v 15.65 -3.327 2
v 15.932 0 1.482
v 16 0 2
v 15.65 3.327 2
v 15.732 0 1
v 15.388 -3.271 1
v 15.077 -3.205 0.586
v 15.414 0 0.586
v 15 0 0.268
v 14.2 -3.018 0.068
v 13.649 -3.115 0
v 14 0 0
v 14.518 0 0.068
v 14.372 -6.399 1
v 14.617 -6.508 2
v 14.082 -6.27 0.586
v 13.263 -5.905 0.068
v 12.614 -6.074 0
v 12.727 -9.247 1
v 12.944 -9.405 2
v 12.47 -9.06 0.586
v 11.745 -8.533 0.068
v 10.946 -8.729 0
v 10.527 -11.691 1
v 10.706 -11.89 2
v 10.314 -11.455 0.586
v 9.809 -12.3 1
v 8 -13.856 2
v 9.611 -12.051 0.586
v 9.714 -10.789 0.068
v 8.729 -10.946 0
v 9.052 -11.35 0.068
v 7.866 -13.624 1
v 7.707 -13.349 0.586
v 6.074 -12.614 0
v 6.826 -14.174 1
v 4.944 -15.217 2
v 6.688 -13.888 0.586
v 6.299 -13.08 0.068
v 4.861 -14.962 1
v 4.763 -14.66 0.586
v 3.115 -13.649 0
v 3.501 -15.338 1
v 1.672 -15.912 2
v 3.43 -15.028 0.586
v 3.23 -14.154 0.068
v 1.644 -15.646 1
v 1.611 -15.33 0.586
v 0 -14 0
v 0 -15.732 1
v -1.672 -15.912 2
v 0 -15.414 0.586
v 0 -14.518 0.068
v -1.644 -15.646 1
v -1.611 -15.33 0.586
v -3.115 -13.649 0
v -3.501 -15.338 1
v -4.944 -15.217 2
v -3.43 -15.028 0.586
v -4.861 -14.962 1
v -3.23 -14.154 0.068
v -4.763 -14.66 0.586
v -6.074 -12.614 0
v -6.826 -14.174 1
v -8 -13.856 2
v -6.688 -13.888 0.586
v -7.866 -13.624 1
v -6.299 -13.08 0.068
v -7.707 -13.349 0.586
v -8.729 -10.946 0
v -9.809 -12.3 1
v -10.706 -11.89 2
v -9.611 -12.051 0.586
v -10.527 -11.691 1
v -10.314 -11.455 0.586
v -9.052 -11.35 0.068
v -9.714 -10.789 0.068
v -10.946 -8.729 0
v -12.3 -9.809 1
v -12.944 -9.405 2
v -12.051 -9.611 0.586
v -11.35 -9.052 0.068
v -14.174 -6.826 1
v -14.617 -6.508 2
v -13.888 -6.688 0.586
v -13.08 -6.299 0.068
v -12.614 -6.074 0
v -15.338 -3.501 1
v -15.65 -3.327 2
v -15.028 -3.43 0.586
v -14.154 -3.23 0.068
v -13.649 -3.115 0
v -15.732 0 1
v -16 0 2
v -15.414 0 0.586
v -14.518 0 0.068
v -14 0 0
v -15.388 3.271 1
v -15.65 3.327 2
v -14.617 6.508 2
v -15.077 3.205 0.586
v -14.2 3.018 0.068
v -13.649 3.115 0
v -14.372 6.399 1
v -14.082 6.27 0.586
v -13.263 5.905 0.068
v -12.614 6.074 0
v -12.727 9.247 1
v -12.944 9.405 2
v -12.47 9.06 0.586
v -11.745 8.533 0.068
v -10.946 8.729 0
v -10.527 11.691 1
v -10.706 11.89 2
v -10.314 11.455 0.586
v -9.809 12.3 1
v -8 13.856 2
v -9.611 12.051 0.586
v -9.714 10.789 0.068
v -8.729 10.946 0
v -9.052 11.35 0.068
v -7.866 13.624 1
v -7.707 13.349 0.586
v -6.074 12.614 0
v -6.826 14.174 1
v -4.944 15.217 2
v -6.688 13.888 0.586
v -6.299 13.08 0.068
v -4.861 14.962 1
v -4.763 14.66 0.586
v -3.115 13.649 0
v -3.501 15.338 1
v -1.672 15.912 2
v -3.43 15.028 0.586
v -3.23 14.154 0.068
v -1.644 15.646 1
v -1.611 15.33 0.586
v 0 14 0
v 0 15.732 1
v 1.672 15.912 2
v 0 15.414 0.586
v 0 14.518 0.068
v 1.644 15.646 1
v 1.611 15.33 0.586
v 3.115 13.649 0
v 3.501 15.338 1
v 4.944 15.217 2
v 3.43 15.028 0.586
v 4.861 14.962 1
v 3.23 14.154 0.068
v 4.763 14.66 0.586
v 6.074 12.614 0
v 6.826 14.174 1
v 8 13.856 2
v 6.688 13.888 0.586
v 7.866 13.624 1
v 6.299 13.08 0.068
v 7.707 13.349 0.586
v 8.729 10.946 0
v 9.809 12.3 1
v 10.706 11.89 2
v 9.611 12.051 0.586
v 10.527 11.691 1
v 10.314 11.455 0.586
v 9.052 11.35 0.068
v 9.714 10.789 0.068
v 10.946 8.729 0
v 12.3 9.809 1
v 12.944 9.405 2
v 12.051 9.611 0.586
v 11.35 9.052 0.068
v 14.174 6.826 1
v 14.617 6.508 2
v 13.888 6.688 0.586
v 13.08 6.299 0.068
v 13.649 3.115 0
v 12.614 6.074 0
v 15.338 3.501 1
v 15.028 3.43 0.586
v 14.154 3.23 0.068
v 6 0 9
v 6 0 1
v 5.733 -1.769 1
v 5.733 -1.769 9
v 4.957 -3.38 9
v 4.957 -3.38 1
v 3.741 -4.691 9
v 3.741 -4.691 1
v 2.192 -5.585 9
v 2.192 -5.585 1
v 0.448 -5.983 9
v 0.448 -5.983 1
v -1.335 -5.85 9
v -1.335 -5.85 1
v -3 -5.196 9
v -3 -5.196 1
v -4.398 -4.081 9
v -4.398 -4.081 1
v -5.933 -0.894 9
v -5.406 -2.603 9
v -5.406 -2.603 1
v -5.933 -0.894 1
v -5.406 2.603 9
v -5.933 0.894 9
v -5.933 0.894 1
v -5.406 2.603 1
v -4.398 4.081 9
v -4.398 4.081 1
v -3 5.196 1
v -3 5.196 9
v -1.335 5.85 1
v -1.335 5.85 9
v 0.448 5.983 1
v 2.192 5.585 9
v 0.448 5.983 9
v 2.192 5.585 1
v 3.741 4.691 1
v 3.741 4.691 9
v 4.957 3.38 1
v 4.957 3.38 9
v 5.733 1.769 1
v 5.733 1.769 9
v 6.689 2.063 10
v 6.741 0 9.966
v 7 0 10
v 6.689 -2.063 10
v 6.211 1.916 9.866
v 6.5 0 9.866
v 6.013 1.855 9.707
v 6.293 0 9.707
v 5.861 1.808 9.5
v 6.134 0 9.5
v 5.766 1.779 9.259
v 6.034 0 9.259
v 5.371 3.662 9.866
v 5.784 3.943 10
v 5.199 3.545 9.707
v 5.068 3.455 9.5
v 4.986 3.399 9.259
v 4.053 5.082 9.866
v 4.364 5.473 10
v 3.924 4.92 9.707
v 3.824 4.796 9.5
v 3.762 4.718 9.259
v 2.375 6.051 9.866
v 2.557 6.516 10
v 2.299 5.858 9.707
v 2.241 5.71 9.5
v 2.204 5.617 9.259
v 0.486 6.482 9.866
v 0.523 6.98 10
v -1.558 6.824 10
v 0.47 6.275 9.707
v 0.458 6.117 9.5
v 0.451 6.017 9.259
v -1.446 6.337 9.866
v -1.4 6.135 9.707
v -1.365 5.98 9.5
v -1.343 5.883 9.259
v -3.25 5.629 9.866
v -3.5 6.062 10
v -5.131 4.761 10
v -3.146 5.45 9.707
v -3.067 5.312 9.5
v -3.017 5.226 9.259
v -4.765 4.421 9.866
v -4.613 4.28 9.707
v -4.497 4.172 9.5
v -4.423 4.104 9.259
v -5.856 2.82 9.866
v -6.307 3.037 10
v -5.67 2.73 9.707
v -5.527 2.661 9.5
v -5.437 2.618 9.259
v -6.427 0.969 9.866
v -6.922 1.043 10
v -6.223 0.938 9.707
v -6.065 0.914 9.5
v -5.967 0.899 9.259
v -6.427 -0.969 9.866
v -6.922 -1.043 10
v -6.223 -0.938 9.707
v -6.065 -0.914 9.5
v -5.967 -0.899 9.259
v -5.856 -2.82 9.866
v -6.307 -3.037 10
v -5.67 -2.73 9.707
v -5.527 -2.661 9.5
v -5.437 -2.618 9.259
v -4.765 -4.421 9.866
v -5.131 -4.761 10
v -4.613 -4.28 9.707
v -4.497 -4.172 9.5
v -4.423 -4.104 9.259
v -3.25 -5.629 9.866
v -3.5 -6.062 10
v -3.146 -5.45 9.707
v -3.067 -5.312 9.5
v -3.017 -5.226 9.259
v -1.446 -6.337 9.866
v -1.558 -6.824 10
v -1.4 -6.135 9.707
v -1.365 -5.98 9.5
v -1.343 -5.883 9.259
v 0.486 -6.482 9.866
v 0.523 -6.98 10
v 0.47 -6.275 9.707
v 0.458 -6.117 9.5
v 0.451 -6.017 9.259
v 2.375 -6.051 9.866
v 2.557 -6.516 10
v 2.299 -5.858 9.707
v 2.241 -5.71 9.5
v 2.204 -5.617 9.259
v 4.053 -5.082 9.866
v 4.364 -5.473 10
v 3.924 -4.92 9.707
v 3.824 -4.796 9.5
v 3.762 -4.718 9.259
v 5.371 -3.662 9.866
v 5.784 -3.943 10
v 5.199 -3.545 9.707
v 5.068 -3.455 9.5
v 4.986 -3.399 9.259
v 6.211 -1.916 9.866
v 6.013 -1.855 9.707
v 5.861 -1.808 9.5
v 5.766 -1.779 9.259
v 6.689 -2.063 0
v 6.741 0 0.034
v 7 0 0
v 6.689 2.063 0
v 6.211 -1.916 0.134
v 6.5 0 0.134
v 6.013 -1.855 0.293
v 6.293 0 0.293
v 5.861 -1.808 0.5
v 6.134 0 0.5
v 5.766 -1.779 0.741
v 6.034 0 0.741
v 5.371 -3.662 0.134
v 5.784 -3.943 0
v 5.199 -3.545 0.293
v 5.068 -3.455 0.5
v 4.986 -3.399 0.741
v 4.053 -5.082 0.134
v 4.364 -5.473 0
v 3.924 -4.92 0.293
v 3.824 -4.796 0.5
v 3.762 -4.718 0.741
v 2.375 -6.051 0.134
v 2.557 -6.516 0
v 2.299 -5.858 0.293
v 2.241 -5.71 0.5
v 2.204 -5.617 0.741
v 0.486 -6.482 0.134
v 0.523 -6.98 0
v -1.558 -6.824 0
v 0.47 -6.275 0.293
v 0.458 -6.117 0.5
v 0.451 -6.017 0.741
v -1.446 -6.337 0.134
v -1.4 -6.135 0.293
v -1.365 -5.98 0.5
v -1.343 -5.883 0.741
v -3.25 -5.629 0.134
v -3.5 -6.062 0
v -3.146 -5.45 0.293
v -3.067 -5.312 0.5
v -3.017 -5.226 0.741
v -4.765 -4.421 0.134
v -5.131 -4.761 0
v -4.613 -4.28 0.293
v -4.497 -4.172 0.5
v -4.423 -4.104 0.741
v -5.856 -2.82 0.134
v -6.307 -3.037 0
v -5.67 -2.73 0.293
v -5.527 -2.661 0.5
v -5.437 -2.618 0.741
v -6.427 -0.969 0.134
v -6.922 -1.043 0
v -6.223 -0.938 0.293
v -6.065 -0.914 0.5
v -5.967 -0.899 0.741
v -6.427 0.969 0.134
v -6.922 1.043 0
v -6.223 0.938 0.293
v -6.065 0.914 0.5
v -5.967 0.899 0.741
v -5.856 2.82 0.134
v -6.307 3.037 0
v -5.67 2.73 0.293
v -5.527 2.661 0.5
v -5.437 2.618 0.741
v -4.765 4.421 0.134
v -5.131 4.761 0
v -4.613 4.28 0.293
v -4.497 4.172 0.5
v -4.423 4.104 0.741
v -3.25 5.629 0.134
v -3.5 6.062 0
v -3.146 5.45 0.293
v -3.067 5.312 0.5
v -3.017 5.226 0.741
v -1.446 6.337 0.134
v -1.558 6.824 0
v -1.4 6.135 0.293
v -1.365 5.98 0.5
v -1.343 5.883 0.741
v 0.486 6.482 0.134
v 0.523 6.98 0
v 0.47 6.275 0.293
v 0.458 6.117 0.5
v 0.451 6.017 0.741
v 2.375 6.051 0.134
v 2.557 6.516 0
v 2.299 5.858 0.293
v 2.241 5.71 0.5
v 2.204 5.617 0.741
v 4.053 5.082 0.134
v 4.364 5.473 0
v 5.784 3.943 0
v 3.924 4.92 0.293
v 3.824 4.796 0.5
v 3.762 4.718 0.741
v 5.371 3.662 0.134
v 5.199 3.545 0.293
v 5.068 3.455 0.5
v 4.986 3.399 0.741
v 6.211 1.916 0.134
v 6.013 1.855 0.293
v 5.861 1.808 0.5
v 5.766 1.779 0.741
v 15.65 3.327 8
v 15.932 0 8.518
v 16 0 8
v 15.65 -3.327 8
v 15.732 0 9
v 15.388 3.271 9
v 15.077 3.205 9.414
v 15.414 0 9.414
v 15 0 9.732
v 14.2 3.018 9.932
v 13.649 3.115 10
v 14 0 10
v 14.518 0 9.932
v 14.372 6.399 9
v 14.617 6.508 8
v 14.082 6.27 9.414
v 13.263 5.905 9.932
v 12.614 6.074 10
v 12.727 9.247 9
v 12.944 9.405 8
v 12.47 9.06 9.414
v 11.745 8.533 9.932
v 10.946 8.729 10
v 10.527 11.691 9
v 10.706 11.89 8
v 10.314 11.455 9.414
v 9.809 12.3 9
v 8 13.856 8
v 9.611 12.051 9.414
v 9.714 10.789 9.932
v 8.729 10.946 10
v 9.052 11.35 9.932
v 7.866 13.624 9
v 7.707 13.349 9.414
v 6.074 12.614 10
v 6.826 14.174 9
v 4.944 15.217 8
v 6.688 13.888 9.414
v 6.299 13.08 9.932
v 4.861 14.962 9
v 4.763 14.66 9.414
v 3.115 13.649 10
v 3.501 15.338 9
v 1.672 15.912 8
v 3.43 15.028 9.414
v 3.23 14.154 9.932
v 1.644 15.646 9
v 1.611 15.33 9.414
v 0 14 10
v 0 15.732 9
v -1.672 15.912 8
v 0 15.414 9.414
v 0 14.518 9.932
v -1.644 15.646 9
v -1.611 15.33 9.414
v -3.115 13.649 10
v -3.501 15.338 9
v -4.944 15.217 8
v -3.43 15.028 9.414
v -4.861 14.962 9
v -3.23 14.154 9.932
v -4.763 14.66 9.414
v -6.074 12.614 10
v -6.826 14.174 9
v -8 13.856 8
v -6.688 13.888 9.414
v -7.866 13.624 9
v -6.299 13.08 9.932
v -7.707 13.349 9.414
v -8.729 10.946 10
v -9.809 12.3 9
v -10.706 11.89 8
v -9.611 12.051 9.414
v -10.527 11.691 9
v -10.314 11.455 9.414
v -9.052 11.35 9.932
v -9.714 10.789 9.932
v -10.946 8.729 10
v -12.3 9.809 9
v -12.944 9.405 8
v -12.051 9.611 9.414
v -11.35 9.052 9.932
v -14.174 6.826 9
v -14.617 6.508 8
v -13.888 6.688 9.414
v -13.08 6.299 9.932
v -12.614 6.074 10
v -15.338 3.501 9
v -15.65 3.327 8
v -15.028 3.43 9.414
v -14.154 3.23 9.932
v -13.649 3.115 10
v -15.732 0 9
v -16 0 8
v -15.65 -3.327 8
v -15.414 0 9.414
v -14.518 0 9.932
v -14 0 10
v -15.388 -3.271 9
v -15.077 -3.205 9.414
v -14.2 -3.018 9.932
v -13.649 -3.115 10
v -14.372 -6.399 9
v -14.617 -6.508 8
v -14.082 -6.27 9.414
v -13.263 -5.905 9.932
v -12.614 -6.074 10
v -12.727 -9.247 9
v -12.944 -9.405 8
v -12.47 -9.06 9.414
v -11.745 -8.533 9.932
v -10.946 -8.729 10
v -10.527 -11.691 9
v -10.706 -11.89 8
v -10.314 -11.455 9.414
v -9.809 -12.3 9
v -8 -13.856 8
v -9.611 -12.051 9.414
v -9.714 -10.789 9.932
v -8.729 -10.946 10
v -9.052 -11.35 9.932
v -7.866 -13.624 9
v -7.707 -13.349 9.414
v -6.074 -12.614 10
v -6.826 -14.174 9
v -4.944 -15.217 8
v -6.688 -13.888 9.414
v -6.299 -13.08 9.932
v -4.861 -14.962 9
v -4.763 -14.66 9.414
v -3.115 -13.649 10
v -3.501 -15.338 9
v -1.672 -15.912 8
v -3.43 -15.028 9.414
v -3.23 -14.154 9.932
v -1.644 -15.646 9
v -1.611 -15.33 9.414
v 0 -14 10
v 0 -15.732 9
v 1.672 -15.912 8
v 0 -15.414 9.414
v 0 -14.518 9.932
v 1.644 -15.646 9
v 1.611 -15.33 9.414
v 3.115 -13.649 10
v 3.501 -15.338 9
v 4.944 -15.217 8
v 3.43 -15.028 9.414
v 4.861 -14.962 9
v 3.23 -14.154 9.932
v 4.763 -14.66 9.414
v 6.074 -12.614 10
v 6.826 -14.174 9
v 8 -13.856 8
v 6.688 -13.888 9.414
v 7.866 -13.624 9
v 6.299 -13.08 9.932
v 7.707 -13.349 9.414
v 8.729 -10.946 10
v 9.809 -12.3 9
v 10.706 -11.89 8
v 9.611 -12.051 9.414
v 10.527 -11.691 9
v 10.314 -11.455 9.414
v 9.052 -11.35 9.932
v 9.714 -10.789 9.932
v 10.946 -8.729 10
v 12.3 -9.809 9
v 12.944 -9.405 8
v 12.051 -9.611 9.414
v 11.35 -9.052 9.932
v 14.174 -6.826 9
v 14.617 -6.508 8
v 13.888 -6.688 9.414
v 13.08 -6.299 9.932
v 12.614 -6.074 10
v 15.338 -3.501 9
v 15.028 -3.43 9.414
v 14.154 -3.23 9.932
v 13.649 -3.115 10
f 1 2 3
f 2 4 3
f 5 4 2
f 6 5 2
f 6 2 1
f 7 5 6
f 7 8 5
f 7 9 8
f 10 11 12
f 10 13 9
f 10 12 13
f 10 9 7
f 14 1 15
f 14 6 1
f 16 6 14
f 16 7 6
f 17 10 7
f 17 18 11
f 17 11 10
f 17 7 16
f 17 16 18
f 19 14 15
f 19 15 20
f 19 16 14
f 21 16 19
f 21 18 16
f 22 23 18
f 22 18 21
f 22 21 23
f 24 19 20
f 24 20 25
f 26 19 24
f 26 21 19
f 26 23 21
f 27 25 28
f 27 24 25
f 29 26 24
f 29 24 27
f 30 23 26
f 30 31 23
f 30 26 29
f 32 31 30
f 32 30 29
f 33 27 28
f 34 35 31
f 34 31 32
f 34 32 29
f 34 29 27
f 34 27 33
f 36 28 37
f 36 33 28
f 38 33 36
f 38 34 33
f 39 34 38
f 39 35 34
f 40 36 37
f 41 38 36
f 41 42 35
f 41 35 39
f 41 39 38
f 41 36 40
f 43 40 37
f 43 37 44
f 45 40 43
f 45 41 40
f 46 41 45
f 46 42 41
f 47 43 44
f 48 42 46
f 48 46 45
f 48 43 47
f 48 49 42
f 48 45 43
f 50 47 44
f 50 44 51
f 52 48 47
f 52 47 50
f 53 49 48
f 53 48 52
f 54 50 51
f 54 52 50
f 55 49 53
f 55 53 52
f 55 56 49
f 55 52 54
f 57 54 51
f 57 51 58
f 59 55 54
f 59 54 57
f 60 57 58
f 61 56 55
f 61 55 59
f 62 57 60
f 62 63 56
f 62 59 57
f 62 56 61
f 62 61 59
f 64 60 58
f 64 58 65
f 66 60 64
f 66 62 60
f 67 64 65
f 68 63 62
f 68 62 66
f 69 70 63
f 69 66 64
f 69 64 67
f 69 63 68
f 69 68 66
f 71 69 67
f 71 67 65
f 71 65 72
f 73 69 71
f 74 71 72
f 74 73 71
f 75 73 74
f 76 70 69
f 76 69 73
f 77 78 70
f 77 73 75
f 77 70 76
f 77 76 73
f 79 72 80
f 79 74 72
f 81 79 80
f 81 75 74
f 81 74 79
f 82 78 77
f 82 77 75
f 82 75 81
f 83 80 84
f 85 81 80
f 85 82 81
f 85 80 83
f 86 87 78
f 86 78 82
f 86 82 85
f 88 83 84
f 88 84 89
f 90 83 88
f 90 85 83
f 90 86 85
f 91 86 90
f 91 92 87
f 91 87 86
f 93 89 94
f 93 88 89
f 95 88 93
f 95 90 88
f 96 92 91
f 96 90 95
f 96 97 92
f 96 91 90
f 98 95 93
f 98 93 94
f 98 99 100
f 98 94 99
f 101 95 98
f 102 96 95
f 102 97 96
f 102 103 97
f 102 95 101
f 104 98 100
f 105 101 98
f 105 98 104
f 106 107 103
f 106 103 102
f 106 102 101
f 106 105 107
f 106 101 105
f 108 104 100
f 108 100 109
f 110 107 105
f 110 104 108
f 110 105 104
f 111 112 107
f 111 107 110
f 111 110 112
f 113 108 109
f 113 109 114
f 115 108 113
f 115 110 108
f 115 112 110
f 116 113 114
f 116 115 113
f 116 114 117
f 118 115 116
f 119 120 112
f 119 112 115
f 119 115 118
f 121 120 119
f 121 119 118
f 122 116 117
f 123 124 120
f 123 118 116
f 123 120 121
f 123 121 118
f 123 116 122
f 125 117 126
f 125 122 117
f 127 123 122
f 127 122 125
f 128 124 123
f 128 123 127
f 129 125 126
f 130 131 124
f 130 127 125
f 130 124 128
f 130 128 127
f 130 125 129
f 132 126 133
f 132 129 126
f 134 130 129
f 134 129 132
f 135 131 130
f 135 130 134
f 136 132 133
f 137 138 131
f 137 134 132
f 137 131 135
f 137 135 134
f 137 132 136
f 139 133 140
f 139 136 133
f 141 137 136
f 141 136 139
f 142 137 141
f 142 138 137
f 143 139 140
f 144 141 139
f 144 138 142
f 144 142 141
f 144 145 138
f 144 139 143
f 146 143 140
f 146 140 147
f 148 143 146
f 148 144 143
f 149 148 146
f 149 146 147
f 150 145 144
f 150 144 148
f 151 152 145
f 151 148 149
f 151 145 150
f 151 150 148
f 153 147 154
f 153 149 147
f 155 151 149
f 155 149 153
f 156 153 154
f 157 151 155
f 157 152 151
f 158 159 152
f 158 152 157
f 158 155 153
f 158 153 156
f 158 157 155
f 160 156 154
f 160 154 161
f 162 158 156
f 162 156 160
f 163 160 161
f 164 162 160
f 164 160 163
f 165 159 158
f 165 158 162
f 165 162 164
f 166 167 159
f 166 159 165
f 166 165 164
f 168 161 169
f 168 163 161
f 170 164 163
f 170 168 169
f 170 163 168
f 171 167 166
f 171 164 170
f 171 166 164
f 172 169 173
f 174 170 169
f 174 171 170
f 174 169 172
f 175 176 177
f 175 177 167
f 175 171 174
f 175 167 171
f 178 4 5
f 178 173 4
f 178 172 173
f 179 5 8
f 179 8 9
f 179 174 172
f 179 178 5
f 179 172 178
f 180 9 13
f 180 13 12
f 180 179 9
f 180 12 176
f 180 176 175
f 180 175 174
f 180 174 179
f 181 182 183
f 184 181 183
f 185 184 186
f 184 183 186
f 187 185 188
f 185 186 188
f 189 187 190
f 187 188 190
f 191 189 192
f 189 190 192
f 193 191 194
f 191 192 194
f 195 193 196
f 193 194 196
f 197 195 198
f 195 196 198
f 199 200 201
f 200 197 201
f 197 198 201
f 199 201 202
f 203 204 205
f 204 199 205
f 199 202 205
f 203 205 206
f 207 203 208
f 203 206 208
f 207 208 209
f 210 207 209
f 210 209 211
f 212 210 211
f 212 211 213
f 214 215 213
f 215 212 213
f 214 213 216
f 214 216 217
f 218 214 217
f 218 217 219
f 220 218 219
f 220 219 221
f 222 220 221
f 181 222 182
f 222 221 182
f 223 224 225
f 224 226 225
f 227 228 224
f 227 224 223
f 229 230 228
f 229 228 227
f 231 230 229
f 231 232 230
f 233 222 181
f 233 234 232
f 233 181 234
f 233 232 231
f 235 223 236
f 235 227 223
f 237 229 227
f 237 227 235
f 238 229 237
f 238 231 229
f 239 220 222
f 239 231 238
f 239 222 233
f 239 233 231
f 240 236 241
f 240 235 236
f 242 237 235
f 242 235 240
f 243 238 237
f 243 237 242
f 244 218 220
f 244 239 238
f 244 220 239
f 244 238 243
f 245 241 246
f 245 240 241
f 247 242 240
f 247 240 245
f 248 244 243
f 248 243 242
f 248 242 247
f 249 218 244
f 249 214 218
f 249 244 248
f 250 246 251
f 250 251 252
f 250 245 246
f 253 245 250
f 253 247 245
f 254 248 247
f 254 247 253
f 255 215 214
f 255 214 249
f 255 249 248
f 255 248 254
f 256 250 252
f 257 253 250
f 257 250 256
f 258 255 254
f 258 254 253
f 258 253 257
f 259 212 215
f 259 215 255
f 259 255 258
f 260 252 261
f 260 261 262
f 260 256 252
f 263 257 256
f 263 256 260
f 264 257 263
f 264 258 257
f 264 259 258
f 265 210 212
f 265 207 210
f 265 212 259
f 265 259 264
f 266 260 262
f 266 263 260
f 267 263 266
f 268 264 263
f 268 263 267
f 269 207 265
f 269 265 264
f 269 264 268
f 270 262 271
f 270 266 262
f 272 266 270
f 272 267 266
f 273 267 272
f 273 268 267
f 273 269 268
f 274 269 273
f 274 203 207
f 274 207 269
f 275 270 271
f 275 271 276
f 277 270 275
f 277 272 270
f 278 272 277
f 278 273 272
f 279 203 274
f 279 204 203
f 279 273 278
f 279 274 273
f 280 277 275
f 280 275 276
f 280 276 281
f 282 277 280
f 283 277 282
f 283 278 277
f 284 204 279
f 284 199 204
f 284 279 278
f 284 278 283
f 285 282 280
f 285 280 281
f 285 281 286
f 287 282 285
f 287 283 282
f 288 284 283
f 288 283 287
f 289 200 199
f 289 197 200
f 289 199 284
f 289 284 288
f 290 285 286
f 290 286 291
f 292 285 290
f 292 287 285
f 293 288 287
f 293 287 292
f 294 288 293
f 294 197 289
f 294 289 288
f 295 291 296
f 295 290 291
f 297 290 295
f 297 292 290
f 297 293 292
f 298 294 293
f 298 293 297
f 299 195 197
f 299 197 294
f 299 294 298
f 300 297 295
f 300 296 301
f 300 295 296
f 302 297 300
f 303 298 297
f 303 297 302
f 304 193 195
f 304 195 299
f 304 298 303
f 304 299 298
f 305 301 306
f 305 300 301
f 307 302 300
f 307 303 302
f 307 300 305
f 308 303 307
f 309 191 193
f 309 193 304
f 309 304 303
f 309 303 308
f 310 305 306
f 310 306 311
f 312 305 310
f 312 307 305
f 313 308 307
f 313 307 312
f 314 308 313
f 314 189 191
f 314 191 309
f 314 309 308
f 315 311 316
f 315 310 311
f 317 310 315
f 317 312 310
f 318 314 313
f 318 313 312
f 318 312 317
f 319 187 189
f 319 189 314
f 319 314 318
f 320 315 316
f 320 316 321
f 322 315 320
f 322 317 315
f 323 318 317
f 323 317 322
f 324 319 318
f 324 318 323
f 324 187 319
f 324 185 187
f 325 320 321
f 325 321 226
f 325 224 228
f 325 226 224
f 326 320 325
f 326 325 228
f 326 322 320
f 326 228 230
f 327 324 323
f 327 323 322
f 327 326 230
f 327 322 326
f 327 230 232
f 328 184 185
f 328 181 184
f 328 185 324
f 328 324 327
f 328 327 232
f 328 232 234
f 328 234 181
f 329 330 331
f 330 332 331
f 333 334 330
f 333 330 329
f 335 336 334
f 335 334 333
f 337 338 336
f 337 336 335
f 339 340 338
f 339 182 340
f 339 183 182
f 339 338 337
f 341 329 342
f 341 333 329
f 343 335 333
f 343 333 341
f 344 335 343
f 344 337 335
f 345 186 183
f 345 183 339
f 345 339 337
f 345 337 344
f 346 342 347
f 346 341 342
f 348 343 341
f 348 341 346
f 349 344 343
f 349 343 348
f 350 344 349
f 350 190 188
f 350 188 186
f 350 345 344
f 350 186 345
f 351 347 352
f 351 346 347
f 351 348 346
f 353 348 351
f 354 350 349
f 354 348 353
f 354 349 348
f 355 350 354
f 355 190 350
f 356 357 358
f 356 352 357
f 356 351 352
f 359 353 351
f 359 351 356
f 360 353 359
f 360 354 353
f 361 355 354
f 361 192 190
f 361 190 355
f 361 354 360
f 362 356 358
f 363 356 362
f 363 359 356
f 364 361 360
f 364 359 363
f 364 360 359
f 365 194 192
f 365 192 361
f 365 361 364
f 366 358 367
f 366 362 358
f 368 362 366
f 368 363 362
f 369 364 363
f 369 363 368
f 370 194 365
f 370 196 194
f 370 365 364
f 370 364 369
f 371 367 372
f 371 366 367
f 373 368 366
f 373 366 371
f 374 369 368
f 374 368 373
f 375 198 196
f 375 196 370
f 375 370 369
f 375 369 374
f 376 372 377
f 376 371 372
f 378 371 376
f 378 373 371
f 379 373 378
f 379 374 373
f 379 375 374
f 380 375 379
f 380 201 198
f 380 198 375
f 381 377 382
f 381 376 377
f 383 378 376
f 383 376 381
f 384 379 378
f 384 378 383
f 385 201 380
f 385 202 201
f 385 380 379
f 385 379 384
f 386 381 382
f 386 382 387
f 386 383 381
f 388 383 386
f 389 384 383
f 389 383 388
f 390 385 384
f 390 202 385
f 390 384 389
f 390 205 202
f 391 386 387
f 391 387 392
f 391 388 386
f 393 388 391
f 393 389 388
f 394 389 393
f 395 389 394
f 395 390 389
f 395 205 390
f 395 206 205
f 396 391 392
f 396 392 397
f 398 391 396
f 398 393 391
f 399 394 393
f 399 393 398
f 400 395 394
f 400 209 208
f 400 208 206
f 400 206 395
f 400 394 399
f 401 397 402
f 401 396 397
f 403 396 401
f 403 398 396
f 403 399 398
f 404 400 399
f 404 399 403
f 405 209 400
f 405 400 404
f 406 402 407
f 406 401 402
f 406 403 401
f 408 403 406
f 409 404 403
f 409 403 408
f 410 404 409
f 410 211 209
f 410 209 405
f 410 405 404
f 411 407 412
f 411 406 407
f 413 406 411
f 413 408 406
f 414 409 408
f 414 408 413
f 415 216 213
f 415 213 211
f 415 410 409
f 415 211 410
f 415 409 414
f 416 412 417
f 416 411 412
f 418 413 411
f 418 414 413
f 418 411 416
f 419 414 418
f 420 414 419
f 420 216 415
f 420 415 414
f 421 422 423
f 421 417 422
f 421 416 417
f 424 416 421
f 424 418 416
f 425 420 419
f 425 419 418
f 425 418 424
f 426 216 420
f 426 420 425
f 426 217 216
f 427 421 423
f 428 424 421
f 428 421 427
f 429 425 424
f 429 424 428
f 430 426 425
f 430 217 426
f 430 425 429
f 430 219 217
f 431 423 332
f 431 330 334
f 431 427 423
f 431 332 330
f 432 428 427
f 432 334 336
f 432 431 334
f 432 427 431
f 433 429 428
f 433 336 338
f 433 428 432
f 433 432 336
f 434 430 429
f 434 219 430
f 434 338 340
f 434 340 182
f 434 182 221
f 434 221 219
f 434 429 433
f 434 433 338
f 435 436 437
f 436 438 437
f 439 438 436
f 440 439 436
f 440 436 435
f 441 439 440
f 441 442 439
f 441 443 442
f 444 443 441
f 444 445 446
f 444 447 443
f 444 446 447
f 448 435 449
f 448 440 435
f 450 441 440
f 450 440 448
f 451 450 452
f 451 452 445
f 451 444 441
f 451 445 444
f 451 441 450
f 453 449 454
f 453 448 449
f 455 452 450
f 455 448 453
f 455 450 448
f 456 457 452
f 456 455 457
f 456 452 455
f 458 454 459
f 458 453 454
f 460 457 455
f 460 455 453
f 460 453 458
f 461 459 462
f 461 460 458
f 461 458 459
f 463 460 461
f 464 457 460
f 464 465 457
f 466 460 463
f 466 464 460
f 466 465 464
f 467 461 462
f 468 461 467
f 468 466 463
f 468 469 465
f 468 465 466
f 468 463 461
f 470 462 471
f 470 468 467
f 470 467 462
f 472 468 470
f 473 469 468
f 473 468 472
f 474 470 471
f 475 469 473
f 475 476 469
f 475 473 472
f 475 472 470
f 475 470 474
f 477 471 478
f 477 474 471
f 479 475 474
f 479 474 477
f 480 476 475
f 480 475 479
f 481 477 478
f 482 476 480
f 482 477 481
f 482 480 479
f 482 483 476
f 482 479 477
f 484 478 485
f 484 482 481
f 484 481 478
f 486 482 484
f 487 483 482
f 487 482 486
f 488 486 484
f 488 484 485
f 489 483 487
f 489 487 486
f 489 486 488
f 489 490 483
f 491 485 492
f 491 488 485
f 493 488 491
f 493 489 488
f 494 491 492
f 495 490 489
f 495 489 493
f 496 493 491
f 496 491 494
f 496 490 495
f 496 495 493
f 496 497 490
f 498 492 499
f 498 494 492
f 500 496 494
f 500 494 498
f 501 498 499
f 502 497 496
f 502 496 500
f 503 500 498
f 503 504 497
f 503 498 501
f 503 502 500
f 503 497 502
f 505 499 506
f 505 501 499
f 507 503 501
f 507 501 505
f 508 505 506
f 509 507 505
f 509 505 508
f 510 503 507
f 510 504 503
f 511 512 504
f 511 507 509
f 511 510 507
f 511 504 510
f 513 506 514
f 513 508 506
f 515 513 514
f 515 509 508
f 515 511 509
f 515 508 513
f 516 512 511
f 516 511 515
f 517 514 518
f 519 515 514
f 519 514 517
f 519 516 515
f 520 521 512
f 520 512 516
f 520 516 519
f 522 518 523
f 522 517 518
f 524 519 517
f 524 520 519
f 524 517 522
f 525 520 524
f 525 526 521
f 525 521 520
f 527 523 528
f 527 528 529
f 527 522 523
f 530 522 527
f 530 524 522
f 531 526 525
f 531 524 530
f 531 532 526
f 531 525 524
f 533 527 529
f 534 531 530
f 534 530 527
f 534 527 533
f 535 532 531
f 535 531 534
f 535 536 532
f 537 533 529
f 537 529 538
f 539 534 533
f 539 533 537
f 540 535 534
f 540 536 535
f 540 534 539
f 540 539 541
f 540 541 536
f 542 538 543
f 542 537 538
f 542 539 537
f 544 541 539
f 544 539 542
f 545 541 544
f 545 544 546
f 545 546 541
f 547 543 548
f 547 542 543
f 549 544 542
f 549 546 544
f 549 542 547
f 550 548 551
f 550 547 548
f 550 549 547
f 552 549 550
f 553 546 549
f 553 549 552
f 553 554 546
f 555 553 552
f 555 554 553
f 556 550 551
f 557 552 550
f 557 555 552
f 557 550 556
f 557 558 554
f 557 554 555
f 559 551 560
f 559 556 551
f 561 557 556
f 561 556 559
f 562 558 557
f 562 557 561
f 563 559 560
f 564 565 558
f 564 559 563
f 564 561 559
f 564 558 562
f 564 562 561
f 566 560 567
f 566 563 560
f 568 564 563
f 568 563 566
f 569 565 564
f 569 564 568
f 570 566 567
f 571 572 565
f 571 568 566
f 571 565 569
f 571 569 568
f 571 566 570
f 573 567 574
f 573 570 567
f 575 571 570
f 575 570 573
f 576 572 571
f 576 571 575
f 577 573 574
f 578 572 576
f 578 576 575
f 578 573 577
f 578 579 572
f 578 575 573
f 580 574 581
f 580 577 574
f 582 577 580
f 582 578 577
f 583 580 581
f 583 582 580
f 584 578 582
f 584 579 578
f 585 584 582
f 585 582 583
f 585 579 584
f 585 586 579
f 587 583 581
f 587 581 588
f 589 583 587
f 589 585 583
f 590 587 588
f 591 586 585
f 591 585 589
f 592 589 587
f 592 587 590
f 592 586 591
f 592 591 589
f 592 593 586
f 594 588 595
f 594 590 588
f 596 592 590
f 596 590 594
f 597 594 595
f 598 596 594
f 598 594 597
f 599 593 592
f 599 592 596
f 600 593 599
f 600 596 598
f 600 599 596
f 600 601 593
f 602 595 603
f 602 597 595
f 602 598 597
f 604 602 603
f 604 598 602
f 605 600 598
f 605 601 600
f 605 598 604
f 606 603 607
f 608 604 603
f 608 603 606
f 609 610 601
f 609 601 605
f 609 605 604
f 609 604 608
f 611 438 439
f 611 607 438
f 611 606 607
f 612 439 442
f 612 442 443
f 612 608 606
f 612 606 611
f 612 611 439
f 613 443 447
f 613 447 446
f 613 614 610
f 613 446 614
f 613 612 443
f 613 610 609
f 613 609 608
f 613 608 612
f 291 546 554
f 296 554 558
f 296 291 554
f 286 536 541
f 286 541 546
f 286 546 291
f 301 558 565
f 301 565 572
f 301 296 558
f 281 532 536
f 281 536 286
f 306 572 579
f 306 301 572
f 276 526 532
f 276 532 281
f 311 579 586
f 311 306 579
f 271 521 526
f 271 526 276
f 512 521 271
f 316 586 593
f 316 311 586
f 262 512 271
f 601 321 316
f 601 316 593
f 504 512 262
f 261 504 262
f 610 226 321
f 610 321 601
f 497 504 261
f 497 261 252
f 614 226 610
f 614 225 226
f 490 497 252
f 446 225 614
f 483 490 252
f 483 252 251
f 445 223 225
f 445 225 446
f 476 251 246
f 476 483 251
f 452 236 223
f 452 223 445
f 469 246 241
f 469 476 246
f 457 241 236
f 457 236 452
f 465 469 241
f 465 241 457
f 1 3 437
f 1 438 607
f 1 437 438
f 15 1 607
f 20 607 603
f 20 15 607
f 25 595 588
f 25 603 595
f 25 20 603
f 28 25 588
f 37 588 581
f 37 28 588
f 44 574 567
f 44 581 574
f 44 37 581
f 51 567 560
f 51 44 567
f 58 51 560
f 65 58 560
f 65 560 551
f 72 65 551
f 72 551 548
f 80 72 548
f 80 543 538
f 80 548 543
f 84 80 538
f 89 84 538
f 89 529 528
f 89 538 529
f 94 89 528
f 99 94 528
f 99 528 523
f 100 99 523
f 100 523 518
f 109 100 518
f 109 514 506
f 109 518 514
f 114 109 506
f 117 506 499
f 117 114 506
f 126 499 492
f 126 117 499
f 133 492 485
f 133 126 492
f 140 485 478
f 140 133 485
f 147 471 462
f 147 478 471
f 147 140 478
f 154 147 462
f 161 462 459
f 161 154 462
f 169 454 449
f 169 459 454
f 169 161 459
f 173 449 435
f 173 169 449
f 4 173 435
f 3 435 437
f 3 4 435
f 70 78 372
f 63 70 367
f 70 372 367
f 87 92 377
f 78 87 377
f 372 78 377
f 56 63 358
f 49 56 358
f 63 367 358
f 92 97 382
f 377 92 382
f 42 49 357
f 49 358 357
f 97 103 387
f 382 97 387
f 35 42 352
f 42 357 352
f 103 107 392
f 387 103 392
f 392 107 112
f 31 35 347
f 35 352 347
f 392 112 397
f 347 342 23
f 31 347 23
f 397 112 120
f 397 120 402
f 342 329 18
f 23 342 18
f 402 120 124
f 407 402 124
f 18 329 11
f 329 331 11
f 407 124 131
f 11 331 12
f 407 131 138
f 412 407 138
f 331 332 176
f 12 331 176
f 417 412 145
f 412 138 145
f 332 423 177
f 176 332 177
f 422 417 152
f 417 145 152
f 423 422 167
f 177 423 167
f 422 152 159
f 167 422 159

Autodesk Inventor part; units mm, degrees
ref_plane "YZ Plane" through (0, 0, 0) normal (1, 0, 0) x (0, 1, 0)
ref_plane "XZ Plane" through (0, 0, 0) normal (0, 1, 0) x (-1, 0, 0)
ref_plane "XY Plane" through (0, 0, 0) normal (0, 0, 1) x (1, 0, 0)
sketch "Sketch1" plane through (0, 0, 0) normal (0, 0, 1) x (1, 0, 0)
  circle A0 centre (0, 0) radius 16
  circle A1 centre (0, 0) radius 6
  dimension "d0" = 32
  dimension "d1" = 12
extrude "Extrusion1" add sketch "Sketch1" along normal blind 10
fillet "Fillet1" radius 2 2 edges at (-16, 0, 10) (-16, 0, 0)
fillet "Fillet2" radius 1 2 edges at (-6, 0, 10) (-6, 0, 0)
properties part number "6201RS" material "Steel, Carbon"
